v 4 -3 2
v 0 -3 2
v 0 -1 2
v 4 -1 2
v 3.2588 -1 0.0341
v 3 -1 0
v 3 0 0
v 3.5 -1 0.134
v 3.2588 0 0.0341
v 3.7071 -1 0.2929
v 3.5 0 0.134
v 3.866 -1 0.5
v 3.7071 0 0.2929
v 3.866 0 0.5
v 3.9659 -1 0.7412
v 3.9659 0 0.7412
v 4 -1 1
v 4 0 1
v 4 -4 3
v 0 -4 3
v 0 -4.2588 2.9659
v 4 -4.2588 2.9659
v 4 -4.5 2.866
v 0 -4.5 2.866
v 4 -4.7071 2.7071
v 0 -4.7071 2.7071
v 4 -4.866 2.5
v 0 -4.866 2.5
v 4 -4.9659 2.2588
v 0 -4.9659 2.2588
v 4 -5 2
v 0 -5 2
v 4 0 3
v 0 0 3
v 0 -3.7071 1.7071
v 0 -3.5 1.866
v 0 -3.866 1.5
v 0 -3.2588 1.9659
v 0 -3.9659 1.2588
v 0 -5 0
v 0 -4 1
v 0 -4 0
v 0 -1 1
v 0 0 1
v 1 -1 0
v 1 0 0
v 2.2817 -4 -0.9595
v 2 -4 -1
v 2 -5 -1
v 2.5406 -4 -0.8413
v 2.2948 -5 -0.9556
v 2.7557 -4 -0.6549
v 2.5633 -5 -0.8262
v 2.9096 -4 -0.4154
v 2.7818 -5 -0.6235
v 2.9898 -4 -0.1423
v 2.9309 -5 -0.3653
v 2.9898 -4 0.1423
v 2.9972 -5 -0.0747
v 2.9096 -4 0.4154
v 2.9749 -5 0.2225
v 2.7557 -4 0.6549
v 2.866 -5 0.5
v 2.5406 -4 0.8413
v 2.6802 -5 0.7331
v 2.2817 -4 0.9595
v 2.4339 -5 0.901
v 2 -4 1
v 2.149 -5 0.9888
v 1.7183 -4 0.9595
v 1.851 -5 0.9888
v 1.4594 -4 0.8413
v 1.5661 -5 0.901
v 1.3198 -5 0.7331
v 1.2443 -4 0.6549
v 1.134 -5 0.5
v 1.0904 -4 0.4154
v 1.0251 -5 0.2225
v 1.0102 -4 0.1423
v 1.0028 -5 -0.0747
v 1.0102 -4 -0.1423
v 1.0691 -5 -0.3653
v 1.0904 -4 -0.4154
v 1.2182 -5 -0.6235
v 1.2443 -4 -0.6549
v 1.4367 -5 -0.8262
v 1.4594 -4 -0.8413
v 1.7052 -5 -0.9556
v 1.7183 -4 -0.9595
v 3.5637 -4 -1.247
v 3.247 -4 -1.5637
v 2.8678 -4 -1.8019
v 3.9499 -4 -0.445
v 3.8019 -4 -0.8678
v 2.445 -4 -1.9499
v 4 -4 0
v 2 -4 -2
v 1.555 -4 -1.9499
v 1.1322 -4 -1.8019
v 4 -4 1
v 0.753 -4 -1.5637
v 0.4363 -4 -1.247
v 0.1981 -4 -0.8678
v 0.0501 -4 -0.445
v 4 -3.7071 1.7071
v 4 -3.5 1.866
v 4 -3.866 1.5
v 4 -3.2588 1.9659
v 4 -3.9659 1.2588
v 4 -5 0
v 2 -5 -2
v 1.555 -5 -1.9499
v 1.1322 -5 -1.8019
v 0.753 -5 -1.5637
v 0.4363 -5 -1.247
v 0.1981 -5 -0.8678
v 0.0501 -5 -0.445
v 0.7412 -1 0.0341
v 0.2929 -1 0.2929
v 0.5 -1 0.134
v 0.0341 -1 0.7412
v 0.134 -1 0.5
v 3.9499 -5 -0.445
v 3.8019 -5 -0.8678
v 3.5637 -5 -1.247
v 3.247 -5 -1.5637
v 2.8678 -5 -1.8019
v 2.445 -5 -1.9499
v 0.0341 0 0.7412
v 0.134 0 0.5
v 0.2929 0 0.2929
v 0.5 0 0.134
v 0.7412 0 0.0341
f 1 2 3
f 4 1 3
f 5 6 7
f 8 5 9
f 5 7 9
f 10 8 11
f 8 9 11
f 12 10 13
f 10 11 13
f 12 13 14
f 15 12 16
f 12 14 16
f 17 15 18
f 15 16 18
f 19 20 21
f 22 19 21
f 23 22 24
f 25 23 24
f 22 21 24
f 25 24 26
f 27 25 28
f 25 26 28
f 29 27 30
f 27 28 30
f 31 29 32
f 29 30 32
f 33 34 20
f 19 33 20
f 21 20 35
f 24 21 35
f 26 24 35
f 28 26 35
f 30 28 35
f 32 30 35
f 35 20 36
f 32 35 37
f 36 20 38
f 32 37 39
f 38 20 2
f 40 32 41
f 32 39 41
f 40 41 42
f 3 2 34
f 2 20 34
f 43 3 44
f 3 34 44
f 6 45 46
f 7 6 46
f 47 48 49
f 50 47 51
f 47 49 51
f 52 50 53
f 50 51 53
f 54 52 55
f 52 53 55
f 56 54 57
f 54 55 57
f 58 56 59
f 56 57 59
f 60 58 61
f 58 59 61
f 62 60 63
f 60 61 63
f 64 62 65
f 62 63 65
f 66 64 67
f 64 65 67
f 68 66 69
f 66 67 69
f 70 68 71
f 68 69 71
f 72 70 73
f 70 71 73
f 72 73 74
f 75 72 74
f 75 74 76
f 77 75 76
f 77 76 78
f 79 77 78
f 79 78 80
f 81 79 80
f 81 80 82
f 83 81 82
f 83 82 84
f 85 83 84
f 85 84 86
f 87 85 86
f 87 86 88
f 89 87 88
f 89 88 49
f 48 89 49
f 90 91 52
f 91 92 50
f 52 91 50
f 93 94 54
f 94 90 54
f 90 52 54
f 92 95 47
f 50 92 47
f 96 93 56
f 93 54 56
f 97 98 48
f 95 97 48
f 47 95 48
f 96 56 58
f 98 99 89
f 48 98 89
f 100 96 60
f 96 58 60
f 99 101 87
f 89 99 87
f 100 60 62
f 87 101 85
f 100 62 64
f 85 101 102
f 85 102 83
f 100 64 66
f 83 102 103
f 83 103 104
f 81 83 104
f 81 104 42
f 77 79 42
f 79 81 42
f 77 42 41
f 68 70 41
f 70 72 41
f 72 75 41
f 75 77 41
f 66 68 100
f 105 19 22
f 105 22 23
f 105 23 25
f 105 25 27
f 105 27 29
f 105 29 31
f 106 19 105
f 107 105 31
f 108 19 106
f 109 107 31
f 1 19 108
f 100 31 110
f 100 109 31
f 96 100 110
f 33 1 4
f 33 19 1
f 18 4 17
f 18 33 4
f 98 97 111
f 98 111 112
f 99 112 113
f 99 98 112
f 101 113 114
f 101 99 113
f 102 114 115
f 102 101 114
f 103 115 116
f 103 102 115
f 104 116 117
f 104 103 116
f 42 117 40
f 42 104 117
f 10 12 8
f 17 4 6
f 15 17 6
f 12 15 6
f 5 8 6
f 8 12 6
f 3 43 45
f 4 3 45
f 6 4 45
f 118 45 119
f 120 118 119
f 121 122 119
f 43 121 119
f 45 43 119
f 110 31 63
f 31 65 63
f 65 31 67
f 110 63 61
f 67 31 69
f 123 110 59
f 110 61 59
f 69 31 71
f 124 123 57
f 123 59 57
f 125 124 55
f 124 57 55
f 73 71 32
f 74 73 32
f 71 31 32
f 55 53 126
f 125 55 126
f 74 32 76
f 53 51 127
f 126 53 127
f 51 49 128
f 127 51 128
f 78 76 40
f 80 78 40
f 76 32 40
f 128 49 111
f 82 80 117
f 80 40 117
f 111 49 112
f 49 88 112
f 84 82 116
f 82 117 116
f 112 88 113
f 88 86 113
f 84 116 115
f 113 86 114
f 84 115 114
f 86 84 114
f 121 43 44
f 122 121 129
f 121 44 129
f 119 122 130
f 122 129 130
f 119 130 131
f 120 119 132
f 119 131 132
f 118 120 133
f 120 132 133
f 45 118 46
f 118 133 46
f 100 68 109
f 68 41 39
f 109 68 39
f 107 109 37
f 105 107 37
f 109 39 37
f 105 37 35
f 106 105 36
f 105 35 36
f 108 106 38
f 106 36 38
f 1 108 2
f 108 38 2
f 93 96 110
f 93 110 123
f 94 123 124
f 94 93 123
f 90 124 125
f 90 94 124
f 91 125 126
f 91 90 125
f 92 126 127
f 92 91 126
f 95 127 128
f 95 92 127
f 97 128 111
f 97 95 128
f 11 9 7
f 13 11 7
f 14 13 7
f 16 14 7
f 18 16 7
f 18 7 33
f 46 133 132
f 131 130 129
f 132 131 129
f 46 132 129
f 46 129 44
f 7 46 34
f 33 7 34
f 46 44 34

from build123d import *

# Parameters (mm, degrees)
EXTRUDE_1_DEPTH          = 4
CUT_EXTRUDE_1_DEPTH      = 3
CUT_EXTRUDE_2_DEPTH      = 8.071067812
CUT_EXTRUDE_2_DEPTH_BACK = 3
SKETCH_4_R               = 1
CUT_EXTRUDE_3_DEPTH      = 3


with BuildPart() as part:
    # 草圖1 → 填料-伸長1 (new body)
    with BuildSketch(Plane(origin=(0, 0, 0), x_dir=(0, 0, -1), z_dir=(1, 0, 0))):
        with BuildLine():
            Line((0, 0), (-3, 0))
            Line((-3, 0), (-3, -4))
            ThreePointArc((-3, -4), (-2.707106781, -4.707106781), (-2, -5))
            Line((-2, -5), (2, -5))
            Line((2, -5), (2, -4))
            Line((2, -4), (-1, -4))
            ThreePointArc((-1, -4), (-1.707106781, -3.707106781), (-2, -3))
            Line((-2, -3), (-2, -1))
            Line((-2, -1), (0, -1))
            Line((0, -1), (0, 0))
        make_face()
    extrude(amount=EXTRUDE_1_DEPTH)

    # 草圖2 → 除料-伸長1 (cut)
    with BuildSketch(Plane(origin=(0, 0, 0), x_dir=(1, 0, 0), z_dir=(0, 1, 0))):
        with BuildLine():
            ThreePointArc((0, -1), (0.292893219, -0.292893219), (1, 0))
            Line((1, 0), (0, 0))
            Line((0, 0), (0, -1))
        make_face()
        with BuildLine():
            Line((4, 0), (3, 0))
            ThreePointArc((3, 0), (3.707106781, -0.292893219), (4, -1))
            Line((4, -1), (4, 0))
        make_face()
    extrude(amount=-CUT_EXTRUDE_1_DEPTH, mode=Mode.SUBTRACT)

    # 草圖3 → 除料-伸長2 (cut, two sides: drawn at the far end of the back side and taken through both)
    with BuildSketch(Plane.XZ.offset(5).offset(-CUT_EXTRUDE_2_DEPTH_BACK)):
        with BuildLine():
            Line((0, -0.361789115), (0, -2))
            Line((0, -2), (2, -2))
            ThreePointArc((2, -2), (0.585786438, -1.414213562), (0, 0))
            Line((0, 0), (0, -0.361789115))
        make_face()
        with BuildLine():
            ThreePointArc((4, 0), (3.414213562, -1.414213562), (2, -2))
            Line((2, -2), (4, -2))
            Line((4, -2), (4, -0.361789115))
            Line((4, -0.361789115), (4, 0))
        make_face()
    extrude(amount=CUT_EXTRUDE_2_DEPTH + CUT_EXTRUDE_2_DEPTH_BACK, mode=Mode.SUBTRACT)

    # 草圖4 → 除料-伸長3 (cut)
    with BuildSketch(Plane.XZ.offset(5)):
        with Locations(Location((2, 0, 0), (0, 0, 270))):
            Circle(SKETCH_4_R)
    extrude(amount=-CUT_EXTRUDE_3_DEPTH, mode=Mode.SUBTRACT)


solid = part.part
